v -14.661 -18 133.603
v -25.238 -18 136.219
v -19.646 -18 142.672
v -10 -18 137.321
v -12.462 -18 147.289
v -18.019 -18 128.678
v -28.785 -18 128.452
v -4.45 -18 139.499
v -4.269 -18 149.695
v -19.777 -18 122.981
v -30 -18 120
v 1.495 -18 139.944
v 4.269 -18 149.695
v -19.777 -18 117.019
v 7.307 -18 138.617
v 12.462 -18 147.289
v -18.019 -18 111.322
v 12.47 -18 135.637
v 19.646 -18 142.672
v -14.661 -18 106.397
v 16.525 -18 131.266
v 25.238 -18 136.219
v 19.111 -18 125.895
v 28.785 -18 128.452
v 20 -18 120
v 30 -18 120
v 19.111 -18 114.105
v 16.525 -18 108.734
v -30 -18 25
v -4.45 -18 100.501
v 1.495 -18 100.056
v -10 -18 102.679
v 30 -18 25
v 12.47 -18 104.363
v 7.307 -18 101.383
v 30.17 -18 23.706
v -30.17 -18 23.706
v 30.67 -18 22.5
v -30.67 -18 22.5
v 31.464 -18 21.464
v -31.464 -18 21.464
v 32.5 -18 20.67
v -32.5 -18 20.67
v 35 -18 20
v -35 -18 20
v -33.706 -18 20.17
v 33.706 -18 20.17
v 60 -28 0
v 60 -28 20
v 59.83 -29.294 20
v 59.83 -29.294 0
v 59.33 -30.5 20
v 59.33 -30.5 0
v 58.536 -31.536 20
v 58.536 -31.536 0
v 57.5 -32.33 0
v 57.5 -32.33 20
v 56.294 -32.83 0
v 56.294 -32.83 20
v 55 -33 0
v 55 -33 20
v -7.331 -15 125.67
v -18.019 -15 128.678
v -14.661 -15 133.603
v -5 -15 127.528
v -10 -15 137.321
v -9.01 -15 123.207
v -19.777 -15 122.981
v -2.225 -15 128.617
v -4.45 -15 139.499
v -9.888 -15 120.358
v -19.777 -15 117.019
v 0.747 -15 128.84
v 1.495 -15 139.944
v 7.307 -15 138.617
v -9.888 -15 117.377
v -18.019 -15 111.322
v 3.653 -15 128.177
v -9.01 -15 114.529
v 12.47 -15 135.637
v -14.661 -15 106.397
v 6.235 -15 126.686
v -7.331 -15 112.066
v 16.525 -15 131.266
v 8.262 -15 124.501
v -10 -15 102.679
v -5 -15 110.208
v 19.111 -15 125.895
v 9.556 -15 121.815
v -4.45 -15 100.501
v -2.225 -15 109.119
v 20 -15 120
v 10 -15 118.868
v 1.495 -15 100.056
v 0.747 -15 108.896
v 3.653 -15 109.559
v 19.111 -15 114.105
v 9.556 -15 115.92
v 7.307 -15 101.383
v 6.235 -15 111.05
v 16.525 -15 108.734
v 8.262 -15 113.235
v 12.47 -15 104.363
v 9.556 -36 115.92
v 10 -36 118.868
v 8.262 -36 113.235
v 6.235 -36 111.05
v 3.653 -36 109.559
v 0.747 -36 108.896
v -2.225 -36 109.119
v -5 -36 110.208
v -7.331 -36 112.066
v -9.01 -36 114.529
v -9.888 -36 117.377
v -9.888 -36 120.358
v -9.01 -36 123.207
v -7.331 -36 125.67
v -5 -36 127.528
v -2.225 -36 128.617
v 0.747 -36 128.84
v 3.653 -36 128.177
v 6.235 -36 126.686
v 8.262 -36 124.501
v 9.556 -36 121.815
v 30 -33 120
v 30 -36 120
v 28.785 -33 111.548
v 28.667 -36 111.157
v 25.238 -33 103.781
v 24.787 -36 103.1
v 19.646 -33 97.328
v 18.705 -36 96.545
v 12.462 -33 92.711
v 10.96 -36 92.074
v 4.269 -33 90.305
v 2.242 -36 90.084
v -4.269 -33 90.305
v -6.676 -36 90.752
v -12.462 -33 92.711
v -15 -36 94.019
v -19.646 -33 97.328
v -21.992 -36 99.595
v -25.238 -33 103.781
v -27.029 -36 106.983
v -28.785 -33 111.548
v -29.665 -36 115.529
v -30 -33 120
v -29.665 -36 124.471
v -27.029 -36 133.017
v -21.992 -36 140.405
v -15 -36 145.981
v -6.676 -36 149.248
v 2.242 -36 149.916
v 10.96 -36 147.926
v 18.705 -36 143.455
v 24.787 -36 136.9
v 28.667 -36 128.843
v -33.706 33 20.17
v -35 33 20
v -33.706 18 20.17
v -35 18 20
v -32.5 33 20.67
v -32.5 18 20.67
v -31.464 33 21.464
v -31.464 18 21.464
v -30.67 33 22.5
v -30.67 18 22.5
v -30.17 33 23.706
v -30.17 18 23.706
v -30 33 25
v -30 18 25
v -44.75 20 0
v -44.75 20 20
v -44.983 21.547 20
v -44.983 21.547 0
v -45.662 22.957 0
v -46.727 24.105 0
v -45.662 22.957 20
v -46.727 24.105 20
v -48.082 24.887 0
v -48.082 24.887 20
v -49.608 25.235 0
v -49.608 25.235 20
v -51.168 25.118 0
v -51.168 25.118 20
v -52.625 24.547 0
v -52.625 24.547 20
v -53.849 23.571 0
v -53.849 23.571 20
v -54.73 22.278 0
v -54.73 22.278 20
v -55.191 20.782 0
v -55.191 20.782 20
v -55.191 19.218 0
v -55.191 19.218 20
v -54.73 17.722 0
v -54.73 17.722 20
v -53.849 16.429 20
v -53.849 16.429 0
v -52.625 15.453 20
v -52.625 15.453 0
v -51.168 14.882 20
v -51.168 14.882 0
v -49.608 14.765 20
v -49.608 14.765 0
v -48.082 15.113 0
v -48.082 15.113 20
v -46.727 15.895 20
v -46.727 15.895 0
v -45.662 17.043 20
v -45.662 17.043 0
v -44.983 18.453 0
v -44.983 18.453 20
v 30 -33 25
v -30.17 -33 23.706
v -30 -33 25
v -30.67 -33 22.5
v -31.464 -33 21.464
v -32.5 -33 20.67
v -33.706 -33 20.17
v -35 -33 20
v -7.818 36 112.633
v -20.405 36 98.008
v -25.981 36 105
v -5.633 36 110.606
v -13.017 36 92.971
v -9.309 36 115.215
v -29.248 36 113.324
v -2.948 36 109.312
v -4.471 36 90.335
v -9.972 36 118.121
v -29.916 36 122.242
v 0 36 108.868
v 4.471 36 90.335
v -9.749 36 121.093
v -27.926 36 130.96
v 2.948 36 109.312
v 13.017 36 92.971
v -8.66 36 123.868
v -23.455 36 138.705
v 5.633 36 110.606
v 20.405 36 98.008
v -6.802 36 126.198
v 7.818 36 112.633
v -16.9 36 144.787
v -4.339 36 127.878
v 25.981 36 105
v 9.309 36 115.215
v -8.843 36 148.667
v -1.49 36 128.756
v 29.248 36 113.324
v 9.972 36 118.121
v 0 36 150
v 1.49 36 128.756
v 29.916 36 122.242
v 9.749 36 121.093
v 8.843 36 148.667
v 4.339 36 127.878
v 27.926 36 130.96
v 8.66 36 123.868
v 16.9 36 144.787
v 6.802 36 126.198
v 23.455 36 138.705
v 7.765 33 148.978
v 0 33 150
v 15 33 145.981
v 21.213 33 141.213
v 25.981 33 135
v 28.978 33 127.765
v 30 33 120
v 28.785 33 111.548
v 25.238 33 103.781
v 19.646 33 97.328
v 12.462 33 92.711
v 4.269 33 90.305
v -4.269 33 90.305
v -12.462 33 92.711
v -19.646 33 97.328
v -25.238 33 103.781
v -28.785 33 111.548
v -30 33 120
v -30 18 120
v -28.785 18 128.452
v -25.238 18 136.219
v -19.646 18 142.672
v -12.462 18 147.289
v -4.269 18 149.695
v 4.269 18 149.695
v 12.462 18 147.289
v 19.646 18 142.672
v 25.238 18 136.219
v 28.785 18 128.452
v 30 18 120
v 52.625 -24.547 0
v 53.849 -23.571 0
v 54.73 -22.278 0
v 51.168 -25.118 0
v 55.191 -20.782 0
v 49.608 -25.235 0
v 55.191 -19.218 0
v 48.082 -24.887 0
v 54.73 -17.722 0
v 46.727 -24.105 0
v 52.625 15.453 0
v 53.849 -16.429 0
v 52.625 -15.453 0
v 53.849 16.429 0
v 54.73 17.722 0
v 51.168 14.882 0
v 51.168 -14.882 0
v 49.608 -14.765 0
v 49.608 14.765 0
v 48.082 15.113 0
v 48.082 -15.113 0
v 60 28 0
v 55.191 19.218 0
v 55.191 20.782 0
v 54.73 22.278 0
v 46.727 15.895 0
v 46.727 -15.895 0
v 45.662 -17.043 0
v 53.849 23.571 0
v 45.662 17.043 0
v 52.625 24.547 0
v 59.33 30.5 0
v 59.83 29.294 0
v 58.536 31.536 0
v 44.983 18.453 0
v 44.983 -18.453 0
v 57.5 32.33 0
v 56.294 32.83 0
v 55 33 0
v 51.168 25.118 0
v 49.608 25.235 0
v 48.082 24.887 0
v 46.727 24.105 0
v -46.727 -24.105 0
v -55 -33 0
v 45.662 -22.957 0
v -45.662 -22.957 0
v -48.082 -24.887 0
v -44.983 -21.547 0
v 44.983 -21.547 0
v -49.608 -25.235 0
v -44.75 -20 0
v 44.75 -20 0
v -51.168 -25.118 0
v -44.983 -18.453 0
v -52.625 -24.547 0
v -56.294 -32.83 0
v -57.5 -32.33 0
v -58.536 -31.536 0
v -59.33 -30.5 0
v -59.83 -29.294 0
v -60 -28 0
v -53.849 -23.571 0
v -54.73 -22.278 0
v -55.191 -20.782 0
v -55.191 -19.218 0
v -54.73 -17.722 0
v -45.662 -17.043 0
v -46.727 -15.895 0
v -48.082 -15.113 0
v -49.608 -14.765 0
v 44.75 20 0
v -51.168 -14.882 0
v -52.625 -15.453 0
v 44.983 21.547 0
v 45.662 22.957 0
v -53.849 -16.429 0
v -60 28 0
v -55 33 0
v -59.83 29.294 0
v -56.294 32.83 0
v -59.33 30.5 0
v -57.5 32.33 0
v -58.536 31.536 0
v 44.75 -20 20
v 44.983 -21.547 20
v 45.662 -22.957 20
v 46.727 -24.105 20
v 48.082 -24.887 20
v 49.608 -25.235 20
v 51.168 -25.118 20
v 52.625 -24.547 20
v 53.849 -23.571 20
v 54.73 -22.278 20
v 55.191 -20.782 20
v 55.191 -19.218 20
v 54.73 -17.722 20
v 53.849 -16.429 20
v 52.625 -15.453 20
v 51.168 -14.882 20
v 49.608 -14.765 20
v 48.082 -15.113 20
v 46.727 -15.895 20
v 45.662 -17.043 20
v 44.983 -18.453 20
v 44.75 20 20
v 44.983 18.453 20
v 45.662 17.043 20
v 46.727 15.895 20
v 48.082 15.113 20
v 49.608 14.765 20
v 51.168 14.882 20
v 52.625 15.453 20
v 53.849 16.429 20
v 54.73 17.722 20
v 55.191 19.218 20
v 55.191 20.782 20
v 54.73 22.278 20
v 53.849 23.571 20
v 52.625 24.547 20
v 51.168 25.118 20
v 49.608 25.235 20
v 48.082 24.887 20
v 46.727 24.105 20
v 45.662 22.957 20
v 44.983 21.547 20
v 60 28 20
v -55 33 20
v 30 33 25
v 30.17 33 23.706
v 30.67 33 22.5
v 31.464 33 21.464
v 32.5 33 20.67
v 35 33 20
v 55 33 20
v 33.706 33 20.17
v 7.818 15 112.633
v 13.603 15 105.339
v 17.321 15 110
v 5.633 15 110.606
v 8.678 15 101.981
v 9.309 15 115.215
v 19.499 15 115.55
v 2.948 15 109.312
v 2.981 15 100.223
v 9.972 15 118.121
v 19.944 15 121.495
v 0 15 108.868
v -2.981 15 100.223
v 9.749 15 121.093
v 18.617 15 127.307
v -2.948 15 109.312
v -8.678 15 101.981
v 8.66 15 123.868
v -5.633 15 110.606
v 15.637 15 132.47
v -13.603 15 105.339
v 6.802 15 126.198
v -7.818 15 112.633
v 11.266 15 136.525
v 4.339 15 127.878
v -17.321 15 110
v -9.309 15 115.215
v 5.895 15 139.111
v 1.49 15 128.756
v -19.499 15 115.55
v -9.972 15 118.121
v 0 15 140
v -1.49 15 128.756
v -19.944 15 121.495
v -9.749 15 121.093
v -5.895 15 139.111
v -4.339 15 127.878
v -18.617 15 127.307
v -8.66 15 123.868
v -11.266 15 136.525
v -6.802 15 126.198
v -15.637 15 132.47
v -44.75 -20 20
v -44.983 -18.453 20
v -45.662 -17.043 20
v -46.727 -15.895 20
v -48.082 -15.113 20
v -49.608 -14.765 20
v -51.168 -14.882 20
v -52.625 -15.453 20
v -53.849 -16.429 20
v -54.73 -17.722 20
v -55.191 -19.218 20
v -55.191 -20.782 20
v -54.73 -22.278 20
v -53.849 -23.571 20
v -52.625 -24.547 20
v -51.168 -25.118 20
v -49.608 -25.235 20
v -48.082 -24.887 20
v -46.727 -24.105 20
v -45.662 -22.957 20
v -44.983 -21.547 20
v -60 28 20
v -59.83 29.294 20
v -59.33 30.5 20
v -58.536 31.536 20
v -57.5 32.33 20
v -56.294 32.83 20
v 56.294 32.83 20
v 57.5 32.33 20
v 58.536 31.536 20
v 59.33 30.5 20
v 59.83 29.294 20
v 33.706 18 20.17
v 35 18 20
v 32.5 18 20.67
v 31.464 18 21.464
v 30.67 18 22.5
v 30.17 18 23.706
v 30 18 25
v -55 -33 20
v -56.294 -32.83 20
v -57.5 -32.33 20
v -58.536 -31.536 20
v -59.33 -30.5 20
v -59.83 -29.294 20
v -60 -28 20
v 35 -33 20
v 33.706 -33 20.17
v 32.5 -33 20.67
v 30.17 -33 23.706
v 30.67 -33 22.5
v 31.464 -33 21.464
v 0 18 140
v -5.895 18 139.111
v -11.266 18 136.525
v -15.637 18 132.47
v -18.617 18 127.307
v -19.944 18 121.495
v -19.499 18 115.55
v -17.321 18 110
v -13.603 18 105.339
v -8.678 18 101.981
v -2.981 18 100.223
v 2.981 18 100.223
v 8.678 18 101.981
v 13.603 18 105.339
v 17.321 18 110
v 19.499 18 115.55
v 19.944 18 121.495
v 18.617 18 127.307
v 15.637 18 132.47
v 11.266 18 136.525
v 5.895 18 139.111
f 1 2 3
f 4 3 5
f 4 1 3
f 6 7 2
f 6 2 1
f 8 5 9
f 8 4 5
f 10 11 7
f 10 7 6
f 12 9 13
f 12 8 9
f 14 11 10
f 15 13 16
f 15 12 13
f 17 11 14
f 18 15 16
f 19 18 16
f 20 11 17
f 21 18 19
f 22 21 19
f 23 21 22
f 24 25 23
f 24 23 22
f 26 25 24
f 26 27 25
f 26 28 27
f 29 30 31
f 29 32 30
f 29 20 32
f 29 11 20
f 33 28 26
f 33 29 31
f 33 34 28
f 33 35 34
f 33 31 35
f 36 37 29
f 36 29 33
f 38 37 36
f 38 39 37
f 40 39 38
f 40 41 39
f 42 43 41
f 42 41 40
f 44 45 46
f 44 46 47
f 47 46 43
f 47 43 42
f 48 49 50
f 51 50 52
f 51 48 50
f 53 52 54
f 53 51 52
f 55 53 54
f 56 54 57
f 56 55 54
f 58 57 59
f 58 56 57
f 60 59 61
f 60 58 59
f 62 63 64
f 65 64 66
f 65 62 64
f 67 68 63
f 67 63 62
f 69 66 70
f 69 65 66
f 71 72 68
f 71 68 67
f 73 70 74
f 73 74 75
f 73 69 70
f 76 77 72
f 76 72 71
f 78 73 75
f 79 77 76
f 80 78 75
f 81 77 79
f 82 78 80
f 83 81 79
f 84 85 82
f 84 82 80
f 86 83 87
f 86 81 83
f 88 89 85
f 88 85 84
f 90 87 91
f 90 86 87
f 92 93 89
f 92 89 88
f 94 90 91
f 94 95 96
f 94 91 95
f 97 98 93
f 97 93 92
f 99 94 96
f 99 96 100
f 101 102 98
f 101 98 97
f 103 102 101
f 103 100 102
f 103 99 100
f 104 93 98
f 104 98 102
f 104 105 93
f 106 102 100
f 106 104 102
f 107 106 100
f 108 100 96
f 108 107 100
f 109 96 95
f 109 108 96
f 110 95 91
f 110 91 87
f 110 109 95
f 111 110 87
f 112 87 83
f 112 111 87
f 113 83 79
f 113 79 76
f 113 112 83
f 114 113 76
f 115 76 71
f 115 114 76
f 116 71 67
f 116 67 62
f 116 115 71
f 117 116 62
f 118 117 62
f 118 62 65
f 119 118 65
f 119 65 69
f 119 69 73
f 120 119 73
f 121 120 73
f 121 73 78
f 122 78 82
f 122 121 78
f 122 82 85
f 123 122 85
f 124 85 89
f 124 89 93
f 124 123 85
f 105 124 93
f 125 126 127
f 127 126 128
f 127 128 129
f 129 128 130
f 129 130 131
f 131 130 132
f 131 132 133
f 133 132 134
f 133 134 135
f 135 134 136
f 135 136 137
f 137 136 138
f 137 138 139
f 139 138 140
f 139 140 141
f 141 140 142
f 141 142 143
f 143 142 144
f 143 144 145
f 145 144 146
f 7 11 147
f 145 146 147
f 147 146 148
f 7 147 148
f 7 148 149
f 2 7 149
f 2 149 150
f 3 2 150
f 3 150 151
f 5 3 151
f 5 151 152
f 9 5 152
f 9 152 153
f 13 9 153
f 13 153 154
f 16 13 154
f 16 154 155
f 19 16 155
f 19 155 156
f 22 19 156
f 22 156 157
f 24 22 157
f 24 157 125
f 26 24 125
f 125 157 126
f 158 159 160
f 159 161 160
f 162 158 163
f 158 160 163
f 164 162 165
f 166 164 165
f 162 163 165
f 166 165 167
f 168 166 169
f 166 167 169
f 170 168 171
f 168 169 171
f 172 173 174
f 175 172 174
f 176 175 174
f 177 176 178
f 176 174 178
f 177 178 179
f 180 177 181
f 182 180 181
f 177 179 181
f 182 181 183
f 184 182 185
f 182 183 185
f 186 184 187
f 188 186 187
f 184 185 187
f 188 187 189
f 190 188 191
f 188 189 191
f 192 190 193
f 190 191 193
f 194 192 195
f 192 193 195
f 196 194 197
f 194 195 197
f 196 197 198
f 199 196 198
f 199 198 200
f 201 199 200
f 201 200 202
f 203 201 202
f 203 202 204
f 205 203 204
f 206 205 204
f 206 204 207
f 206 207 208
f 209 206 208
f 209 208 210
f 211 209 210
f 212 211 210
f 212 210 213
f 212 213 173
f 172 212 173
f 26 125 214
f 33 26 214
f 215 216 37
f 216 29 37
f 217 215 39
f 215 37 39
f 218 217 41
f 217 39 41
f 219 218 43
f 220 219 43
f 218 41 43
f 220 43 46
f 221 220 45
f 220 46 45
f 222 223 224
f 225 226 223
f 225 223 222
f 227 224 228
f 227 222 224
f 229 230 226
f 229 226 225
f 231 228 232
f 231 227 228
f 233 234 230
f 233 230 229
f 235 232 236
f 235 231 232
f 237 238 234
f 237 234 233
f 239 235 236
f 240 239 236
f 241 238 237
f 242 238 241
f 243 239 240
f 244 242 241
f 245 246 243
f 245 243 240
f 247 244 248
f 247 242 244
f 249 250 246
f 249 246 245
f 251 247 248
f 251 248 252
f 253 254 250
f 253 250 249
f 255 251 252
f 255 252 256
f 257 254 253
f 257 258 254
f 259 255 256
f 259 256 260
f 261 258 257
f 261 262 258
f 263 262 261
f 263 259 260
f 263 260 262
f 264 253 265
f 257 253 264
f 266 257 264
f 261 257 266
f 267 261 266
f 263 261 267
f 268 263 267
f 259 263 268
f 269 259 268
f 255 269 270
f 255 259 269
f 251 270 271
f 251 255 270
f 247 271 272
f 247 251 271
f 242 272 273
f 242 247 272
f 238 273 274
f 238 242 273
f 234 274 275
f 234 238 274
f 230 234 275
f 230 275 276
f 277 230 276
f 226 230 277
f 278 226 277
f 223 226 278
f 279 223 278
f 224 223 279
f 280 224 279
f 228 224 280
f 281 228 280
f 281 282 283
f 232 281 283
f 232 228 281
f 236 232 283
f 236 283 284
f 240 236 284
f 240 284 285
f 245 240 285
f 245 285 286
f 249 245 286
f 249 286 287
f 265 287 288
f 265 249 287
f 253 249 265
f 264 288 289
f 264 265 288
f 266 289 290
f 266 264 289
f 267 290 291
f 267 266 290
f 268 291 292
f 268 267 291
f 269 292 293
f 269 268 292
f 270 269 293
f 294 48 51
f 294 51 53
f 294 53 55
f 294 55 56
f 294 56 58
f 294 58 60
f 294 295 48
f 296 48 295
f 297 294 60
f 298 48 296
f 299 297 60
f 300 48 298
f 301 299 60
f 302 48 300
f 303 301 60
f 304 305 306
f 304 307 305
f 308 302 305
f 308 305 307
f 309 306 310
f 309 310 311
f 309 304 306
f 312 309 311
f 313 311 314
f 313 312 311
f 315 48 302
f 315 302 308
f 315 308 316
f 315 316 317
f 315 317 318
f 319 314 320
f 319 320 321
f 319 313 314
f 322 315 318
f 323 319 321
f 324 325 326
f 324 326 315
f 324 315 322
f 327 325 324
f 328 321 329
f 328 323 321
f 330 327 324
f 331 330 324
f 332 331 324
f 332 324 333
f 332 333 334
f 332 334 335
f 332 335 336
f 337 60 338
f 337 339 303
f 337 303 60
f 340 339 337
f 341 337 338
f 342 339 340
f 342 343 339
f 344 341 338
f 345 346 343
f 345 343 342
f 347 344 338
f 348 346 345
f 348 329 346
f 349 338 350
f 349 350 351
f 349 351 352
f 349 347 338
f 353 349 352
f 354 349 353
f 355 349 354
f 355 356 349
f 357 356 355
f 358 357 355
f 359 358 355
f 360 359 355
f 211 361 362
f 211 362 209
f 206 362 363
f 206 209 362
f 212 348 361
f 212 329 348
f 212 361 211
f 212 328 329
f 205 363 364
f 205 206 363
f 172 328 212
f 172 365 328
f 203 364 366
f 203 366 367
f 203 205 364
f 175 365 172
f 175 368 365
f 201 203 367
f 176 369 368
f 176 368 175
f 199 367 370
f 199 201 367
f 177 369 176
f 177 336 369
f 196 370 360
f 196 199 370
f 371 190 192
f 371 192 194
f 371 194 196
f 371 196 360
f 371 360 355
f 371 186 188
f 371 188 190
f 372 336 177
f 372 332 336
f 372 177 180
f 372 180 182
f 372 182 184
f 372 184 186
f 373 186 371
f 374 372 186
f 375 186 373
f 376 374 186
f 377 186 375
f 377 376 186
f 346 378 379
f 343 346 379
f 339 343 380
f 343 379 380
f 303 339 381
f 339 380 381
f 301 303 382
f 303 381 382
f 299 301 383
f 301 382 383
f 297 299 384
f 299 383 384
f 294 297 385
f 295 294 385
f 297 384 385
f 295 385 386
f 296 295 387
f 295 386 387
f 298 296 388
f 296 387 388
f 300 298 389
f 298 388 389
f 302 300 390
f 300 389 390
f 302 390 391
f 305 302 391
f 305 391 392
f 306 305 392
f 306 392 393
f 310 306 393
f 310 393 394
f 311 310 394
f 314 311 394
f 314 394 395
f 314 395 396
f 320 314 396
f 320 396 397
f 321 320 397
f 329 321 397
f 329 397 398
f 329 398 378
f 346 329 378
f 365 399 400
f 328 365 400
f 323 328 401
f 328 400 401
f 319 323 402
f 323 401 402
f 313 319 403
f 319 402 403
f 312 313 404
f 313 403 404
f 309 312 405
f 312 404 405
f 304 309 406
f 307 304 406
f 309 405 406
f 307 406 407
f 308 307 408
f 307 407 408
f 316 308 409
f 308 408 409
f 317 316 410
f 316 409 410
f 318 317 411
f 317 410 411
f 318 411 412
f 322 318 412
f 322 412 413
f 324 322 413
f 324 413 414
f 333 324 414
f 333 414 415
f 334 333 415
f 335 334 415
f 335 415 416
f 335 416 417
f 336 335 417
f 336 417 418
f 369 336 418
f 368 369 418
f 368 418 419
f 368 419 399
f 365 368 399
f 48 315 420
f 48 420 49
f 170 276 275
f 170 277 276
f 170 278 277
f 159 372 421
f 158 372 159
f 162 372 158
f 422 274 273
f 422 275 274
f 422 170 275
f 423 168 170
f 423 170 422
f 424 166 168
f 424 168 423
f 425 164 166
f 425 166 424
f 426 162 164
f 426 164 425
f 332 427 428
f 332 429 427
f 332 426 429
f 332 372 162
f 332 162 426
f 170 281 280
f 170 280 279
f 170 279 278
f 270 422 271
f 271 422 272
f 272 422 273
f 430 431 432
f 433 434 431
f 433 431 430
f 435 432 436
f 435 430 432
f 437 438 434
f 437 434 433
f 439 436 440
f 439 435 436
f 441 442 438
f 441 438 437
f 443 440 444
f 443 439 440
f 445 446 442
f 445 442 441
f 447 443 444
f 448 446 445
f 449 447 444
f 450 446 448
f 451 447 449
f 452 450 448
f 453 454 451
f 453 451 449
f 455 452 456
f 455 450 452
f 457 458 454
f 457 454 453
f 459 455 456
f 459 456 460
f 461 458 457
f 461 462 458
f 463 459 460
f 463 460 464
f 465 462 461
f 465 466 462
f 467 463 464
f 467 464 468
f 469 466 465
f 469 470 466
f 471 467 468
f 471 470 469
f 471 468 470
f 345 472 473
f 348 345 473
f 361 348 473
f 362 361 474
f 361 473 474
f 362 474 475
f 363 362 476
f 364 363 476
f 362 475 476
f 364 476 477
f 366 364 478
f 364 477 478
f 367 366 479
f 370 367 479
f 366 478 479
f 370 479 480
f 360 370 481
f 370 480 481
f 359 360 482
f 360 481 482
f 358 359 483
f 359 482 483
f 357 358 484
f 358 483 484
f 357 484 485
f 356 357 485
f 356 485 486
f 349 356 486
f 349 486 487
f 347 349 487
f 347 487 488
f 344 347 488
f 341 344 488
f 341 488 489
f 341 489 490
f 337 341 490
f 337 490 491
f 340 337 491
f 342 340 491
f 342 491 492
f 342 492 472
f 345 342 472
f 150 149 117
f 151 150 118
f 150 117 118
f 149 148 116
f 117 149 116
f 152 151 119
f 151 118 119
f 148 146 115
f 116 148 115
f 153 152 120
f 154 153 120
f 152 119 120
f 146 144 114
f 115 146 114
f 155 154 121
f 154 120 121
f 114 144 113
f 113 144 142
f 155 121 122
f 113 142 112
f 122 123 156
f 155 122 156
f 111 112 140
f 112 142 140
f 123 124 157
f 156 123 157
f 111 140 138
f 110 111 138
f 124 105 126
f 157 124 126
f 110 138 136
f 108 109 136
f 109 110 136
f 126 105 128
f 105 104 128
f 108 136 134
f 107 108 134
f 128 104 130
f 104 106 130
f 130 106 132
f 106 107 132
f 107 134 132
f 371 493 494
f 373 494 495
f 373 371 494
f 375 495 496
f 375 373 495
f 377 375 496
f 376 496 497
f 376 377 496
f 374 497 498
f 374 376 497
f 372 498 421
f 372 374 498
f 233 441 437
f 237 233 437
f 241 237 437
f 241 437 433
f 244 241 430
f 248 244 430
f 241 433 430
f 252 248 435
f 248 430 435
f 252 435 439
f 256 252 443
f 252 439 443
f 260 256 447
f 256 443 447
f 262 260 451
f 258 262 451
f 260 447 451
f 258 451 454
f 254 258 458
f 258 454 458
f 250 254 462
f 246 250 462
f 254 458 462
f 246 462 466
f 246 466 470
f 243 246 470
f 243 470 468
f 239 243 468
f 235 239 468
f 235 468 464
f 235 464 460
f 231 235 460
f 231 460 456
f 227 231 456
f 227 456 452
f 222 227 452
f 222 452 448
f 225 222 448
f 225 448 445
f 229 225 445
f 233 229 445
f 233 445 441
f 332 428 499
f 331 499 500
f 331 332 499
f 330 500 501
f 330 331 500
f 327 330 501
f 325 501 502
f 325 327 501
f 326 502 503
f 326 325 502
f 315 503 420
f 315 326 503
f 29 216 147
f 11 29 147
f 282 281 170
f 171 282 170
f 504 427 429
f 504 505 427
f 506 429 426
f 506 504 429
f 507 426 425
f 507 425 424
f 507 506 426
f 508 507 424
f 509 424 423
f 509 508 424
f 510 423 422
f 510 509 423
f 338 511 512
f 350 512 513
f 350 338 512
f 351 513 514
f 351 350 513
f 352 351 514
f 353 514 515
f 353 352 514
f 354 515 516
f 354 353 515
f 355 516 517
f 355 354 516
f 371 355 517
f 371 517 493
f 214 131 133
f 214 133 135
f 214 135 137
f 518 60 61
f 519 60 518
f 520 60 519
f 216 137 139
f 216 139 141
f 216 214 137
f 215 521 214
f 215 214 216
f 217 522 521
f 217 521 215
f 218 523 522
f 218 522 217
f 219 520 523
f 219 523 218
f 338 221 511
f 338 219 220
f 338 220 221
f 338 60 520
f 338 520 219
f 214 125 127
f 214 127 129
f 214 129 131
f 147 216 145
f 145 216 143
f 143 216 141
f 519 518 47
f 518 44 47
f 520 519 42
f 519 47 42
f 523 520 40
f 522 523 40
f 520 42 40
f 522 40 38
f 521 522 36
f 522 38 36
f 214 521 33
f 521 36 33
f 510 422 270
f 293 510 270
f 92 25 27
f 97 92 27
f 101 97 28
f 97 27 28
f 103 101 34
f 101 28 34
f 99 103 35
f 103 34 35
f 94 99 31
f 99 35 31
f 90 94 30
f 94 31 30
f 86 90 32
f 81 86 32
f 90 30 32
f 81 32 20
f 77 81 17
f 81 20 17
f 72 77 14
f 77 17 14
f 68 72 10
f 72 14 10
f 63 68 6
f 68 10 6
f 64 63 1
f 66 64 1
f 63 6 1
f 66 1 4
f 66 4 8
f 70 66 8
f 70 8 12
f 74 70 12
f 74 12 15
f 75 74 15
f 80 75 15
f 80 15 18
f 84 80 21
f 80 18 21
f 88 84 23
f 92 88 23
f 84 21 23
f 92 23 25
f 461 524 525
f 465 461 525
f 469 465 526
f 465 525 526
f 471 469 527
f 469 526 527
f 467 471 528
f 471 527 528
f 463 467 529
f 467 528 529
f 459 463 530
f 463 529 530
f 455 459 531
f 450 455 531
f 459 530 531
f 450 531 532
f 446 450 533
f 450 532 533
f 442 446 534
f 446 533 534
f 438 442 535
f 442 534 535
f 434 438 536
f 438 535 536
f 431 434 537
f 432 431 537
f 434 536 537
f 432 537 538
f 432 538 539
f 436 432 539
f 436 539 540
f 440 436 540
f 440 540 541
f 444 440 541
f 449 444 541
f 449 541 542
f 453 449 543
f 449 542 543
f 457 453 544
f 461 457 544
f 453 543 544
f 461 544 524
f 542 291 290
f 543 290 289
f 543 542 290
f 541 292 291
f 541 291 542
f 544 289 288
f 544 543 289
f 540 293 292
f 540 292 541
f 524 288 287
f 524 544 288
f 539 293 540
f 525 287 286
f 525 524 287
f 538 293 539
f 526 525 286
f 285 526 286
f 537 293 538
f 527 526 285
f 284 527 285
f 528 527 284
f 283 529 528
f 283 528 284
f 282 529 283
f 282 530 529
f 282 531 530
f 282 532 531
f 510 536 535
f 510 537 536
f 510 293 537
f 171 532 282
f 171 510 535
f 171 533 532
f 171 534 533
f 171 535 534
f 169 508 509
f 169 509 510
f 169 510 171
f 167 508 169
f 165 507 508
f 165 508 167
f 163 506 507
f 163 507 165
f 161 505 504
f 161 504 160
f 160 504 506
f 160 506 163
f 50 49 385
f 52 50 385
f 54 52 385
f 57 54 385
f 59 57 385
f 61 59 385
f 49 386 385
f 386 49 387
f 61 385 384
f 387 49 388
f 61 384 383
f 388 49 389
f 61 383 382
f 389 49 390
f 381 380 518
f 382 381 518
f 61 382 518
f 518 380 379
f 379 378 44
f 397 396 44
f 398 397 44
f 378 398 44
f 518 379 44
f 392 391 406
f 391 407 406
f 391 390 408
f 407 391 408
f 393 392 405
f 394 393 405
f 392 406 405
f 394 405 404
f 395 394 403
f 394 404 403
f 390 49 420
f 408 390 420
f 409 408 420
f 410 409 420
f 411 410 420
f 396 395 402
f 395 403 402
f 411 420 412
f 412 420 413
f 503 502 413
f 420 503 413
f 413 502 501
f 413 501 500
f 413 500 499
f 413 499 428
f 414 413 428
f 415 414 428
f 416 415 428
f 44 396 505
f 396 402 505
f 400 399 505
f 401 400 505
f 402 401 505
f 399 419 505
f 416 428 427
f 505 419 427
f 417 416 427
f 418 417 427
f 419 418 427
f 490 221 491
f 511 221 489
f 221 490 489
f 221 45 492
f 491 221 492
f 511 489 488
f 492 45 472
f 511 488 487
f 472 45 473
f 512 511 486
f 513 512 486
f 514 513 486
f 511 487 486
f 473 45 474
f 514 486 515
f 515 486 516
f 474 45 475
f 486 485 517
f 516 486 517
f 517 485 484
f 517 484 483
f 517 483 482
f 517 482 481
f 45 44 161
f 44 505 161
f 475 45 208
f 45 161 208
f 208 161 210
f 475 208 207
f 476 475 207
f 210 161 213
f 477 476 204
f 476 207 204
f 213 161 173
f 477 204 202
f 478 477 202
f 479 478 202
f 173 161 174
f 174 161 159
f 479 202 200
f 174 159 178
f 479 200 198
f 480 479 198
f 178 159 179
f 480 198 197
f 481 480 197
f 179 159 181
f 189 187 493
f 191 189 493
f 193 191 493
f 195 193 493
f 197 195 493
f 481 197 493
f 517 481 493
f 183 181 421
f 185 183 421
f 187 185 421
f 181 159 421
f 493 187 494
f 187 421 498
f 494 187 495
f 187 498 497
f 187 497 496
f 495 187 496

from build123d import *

# Parameters (mm, degrees)
Y_KSEKLIK_EKSTR_ZYON1_DEPTH = 20
Y_KSEKLIK_EKSTR_ZYON2_DEPTH = 15
Y_KSEKLIK_EKSTR_ZYON3_START = 3
IZIM3_R                     = 30
Y_KSEKLIK_EKSTR_ZYON3_DEPTH = 3
IZIM4_R                     = 20
Y_KSEKLIK_EKSTR_ZYON4_DEPTH = 3
IZIM5_R                     = 10
KES_EKSTR_ZYON1_DEPTH       = 169.534862862
IZIM6_R                     = 5.25
KES_EKSTR_ZYON2_DEPTH       = 148.634684272
RADYUS1_R                   = 5


with BuildPart() as part:
    # Çizim1 → Yükseklik-Ekstrüzyon1 (new body)
    with BuildSketch(Plane.XY):
        with BuildLine():
            Line((-55, 33), (55, 33))
            ThreePointArc((55, 33), (58.535533906, 31.535533906), (60, 28))
            Line((60, 28), (60, -28))
            ThreePointArc((60, -28), (58.535533906, -31.535533906), (55, -33))
            Line((55, -33), (-55, -33))
            ThreePointArc((-55, -33), (-58.535533906, -31.535533906), (-60, -28))
            Line((-60, -28), (-60, 28))
            ThreePointArc((-60, 28), (-58.535533906, 31.535533906), (-55, 33))
        make_face()
    y_kseklik_ekstr_zyon1 = extrude(amount=Y_KSEKLIK_EKSTR_ZYON1_DEPTH)

    # Çizim2 → Yükseklik-Ekstrüzyon2 (add)
    with BuildSketch(Plane(origin=(0, 33, 0), x_dir=(1, 0, 0), z_dir=(0, 1, 0))):
        with BuildLine():
            Line((-30, -20), (30, -20))
            Line((30, -20), (30, -120))
            ThreePointArc((30, -120), (0, -150), (-30, -120))
            Line((-30, -120), (-30, -20))
        make_face()
    y_kseklik_ekstr_zyon2 = extrude(amount=-Y_KSEKLIK_EKSTR_ZYON2_DEPTH)

    # Çizim3 → Yükseklik-Ekstrüzyon3 (add)
    with BuildSketch(Plane(origin=(0, 33, 0), x_dir=(1, 0, 0), z_dir=(0, 1, 0)).offset(Y_KSEKLIK_EKSTR_ZYON3_START)):
        with Locations((0, -120)):
            Circle(IZIM3_R)
    y_kseklik_ekstr_zyon3 = extrude(amount=-Y_KSEKLIK_EKSTR_ZYON3_DEPTH)

    # Çizim4 → Yükseklik-Ekstrüzyon4 (add)
    with BuildSketch(Plane(origin=(0, 18, 0), x_dir=(-1, 0, 0), z_dir=(0, -1, 0))):
        with Locations((0, -120)):
            Circle(IZIM4_R)
    y_kseklik_ekstr_zyon4 = extrude(amount=Y_KSEKLIK_EKSTR_ZYON4_DEPTH)

    # Çizim5 → Kes-Ekstrüzyon1 (cut, through all)
    with BuildSketch(Plane.XZ.offset(-15)):
        with Locations((0, 118.867910889)):
            Circle(IZIM5_R)
    kes_ekstr_zyon1 = extrude(amount=-KES_EKSTR_ZYON1_DEPTH, mode=Mode.SUBTRACT)

    # Aynalama1: Yükseklik-Ekstrüzyon1, Yükseklik-Ekstrüzyon2, Yükseklik-Ekstrüzyon3, Yükseklik-Ekstrüzyon4, Kes-Ekstrüzyon1 across plane
    add(y_kseklik_ekstr_zyon1.mirror(Plane(origin=(0, 0, 0), x_dir=(0, 0, 1), z_dir=(0, -1, 0))))
    add(y_kseklik_ekstr_zyon2.mirror(Plane(origin=(0, 0, 0), x_dir=(0, 0, 1), z_dir=(0, -1, 0))))
    add(y_kseklik_ekstr_zyon3.mirror(Plane(origin=(0, 0, 0), x_dir=(0, 0, 1), z_dir=(0, -1, 0))))
    add(y_kseklik_ekstr_zyon4.mirror(Plane(origin=(0, 0, 0), x_dir=(0, 0, 1), z_dir=(0, -1, 0))))
    add(kes_ekstr_zyon1.mirror(Plane(origin=(0, 0, 0), x_dir=(0, 0, 1), z_dir=(0, -1, 0))), mode=Mode.SUBTRACT)

    # Çizim6 → Kes-Ekstrüzyon2 (cut, through all)
    with BuildSketch(Plane.XY.offset(20)):
        with Locations((-50, 20)):
            Circle(IZIM6_R)
        with Locations((-50, -20)):
            Circle(IZIM6_R)
        with Locations((50, -20)):
            Circle(IZIM6_R)
        with Locations((50, 20)):
            Circle(IZIM6_R)
    extrude(amount=-KES_EKSTR_ZYON2_DEPTH, mode=Mode.SUBTRACT)

    # Radyus1
    radyus1_edges = [part.edges().sort_by_distance(p)[0] for p in [
        (-30, -25.5, 20),
        (-30, 25.5, 20),
        (30, -25.5, 20),
        (30, 25.5, 20),
    ]]
    fillet(radyus1_edges, radius=RADYUS1_R)


solid = part.part
